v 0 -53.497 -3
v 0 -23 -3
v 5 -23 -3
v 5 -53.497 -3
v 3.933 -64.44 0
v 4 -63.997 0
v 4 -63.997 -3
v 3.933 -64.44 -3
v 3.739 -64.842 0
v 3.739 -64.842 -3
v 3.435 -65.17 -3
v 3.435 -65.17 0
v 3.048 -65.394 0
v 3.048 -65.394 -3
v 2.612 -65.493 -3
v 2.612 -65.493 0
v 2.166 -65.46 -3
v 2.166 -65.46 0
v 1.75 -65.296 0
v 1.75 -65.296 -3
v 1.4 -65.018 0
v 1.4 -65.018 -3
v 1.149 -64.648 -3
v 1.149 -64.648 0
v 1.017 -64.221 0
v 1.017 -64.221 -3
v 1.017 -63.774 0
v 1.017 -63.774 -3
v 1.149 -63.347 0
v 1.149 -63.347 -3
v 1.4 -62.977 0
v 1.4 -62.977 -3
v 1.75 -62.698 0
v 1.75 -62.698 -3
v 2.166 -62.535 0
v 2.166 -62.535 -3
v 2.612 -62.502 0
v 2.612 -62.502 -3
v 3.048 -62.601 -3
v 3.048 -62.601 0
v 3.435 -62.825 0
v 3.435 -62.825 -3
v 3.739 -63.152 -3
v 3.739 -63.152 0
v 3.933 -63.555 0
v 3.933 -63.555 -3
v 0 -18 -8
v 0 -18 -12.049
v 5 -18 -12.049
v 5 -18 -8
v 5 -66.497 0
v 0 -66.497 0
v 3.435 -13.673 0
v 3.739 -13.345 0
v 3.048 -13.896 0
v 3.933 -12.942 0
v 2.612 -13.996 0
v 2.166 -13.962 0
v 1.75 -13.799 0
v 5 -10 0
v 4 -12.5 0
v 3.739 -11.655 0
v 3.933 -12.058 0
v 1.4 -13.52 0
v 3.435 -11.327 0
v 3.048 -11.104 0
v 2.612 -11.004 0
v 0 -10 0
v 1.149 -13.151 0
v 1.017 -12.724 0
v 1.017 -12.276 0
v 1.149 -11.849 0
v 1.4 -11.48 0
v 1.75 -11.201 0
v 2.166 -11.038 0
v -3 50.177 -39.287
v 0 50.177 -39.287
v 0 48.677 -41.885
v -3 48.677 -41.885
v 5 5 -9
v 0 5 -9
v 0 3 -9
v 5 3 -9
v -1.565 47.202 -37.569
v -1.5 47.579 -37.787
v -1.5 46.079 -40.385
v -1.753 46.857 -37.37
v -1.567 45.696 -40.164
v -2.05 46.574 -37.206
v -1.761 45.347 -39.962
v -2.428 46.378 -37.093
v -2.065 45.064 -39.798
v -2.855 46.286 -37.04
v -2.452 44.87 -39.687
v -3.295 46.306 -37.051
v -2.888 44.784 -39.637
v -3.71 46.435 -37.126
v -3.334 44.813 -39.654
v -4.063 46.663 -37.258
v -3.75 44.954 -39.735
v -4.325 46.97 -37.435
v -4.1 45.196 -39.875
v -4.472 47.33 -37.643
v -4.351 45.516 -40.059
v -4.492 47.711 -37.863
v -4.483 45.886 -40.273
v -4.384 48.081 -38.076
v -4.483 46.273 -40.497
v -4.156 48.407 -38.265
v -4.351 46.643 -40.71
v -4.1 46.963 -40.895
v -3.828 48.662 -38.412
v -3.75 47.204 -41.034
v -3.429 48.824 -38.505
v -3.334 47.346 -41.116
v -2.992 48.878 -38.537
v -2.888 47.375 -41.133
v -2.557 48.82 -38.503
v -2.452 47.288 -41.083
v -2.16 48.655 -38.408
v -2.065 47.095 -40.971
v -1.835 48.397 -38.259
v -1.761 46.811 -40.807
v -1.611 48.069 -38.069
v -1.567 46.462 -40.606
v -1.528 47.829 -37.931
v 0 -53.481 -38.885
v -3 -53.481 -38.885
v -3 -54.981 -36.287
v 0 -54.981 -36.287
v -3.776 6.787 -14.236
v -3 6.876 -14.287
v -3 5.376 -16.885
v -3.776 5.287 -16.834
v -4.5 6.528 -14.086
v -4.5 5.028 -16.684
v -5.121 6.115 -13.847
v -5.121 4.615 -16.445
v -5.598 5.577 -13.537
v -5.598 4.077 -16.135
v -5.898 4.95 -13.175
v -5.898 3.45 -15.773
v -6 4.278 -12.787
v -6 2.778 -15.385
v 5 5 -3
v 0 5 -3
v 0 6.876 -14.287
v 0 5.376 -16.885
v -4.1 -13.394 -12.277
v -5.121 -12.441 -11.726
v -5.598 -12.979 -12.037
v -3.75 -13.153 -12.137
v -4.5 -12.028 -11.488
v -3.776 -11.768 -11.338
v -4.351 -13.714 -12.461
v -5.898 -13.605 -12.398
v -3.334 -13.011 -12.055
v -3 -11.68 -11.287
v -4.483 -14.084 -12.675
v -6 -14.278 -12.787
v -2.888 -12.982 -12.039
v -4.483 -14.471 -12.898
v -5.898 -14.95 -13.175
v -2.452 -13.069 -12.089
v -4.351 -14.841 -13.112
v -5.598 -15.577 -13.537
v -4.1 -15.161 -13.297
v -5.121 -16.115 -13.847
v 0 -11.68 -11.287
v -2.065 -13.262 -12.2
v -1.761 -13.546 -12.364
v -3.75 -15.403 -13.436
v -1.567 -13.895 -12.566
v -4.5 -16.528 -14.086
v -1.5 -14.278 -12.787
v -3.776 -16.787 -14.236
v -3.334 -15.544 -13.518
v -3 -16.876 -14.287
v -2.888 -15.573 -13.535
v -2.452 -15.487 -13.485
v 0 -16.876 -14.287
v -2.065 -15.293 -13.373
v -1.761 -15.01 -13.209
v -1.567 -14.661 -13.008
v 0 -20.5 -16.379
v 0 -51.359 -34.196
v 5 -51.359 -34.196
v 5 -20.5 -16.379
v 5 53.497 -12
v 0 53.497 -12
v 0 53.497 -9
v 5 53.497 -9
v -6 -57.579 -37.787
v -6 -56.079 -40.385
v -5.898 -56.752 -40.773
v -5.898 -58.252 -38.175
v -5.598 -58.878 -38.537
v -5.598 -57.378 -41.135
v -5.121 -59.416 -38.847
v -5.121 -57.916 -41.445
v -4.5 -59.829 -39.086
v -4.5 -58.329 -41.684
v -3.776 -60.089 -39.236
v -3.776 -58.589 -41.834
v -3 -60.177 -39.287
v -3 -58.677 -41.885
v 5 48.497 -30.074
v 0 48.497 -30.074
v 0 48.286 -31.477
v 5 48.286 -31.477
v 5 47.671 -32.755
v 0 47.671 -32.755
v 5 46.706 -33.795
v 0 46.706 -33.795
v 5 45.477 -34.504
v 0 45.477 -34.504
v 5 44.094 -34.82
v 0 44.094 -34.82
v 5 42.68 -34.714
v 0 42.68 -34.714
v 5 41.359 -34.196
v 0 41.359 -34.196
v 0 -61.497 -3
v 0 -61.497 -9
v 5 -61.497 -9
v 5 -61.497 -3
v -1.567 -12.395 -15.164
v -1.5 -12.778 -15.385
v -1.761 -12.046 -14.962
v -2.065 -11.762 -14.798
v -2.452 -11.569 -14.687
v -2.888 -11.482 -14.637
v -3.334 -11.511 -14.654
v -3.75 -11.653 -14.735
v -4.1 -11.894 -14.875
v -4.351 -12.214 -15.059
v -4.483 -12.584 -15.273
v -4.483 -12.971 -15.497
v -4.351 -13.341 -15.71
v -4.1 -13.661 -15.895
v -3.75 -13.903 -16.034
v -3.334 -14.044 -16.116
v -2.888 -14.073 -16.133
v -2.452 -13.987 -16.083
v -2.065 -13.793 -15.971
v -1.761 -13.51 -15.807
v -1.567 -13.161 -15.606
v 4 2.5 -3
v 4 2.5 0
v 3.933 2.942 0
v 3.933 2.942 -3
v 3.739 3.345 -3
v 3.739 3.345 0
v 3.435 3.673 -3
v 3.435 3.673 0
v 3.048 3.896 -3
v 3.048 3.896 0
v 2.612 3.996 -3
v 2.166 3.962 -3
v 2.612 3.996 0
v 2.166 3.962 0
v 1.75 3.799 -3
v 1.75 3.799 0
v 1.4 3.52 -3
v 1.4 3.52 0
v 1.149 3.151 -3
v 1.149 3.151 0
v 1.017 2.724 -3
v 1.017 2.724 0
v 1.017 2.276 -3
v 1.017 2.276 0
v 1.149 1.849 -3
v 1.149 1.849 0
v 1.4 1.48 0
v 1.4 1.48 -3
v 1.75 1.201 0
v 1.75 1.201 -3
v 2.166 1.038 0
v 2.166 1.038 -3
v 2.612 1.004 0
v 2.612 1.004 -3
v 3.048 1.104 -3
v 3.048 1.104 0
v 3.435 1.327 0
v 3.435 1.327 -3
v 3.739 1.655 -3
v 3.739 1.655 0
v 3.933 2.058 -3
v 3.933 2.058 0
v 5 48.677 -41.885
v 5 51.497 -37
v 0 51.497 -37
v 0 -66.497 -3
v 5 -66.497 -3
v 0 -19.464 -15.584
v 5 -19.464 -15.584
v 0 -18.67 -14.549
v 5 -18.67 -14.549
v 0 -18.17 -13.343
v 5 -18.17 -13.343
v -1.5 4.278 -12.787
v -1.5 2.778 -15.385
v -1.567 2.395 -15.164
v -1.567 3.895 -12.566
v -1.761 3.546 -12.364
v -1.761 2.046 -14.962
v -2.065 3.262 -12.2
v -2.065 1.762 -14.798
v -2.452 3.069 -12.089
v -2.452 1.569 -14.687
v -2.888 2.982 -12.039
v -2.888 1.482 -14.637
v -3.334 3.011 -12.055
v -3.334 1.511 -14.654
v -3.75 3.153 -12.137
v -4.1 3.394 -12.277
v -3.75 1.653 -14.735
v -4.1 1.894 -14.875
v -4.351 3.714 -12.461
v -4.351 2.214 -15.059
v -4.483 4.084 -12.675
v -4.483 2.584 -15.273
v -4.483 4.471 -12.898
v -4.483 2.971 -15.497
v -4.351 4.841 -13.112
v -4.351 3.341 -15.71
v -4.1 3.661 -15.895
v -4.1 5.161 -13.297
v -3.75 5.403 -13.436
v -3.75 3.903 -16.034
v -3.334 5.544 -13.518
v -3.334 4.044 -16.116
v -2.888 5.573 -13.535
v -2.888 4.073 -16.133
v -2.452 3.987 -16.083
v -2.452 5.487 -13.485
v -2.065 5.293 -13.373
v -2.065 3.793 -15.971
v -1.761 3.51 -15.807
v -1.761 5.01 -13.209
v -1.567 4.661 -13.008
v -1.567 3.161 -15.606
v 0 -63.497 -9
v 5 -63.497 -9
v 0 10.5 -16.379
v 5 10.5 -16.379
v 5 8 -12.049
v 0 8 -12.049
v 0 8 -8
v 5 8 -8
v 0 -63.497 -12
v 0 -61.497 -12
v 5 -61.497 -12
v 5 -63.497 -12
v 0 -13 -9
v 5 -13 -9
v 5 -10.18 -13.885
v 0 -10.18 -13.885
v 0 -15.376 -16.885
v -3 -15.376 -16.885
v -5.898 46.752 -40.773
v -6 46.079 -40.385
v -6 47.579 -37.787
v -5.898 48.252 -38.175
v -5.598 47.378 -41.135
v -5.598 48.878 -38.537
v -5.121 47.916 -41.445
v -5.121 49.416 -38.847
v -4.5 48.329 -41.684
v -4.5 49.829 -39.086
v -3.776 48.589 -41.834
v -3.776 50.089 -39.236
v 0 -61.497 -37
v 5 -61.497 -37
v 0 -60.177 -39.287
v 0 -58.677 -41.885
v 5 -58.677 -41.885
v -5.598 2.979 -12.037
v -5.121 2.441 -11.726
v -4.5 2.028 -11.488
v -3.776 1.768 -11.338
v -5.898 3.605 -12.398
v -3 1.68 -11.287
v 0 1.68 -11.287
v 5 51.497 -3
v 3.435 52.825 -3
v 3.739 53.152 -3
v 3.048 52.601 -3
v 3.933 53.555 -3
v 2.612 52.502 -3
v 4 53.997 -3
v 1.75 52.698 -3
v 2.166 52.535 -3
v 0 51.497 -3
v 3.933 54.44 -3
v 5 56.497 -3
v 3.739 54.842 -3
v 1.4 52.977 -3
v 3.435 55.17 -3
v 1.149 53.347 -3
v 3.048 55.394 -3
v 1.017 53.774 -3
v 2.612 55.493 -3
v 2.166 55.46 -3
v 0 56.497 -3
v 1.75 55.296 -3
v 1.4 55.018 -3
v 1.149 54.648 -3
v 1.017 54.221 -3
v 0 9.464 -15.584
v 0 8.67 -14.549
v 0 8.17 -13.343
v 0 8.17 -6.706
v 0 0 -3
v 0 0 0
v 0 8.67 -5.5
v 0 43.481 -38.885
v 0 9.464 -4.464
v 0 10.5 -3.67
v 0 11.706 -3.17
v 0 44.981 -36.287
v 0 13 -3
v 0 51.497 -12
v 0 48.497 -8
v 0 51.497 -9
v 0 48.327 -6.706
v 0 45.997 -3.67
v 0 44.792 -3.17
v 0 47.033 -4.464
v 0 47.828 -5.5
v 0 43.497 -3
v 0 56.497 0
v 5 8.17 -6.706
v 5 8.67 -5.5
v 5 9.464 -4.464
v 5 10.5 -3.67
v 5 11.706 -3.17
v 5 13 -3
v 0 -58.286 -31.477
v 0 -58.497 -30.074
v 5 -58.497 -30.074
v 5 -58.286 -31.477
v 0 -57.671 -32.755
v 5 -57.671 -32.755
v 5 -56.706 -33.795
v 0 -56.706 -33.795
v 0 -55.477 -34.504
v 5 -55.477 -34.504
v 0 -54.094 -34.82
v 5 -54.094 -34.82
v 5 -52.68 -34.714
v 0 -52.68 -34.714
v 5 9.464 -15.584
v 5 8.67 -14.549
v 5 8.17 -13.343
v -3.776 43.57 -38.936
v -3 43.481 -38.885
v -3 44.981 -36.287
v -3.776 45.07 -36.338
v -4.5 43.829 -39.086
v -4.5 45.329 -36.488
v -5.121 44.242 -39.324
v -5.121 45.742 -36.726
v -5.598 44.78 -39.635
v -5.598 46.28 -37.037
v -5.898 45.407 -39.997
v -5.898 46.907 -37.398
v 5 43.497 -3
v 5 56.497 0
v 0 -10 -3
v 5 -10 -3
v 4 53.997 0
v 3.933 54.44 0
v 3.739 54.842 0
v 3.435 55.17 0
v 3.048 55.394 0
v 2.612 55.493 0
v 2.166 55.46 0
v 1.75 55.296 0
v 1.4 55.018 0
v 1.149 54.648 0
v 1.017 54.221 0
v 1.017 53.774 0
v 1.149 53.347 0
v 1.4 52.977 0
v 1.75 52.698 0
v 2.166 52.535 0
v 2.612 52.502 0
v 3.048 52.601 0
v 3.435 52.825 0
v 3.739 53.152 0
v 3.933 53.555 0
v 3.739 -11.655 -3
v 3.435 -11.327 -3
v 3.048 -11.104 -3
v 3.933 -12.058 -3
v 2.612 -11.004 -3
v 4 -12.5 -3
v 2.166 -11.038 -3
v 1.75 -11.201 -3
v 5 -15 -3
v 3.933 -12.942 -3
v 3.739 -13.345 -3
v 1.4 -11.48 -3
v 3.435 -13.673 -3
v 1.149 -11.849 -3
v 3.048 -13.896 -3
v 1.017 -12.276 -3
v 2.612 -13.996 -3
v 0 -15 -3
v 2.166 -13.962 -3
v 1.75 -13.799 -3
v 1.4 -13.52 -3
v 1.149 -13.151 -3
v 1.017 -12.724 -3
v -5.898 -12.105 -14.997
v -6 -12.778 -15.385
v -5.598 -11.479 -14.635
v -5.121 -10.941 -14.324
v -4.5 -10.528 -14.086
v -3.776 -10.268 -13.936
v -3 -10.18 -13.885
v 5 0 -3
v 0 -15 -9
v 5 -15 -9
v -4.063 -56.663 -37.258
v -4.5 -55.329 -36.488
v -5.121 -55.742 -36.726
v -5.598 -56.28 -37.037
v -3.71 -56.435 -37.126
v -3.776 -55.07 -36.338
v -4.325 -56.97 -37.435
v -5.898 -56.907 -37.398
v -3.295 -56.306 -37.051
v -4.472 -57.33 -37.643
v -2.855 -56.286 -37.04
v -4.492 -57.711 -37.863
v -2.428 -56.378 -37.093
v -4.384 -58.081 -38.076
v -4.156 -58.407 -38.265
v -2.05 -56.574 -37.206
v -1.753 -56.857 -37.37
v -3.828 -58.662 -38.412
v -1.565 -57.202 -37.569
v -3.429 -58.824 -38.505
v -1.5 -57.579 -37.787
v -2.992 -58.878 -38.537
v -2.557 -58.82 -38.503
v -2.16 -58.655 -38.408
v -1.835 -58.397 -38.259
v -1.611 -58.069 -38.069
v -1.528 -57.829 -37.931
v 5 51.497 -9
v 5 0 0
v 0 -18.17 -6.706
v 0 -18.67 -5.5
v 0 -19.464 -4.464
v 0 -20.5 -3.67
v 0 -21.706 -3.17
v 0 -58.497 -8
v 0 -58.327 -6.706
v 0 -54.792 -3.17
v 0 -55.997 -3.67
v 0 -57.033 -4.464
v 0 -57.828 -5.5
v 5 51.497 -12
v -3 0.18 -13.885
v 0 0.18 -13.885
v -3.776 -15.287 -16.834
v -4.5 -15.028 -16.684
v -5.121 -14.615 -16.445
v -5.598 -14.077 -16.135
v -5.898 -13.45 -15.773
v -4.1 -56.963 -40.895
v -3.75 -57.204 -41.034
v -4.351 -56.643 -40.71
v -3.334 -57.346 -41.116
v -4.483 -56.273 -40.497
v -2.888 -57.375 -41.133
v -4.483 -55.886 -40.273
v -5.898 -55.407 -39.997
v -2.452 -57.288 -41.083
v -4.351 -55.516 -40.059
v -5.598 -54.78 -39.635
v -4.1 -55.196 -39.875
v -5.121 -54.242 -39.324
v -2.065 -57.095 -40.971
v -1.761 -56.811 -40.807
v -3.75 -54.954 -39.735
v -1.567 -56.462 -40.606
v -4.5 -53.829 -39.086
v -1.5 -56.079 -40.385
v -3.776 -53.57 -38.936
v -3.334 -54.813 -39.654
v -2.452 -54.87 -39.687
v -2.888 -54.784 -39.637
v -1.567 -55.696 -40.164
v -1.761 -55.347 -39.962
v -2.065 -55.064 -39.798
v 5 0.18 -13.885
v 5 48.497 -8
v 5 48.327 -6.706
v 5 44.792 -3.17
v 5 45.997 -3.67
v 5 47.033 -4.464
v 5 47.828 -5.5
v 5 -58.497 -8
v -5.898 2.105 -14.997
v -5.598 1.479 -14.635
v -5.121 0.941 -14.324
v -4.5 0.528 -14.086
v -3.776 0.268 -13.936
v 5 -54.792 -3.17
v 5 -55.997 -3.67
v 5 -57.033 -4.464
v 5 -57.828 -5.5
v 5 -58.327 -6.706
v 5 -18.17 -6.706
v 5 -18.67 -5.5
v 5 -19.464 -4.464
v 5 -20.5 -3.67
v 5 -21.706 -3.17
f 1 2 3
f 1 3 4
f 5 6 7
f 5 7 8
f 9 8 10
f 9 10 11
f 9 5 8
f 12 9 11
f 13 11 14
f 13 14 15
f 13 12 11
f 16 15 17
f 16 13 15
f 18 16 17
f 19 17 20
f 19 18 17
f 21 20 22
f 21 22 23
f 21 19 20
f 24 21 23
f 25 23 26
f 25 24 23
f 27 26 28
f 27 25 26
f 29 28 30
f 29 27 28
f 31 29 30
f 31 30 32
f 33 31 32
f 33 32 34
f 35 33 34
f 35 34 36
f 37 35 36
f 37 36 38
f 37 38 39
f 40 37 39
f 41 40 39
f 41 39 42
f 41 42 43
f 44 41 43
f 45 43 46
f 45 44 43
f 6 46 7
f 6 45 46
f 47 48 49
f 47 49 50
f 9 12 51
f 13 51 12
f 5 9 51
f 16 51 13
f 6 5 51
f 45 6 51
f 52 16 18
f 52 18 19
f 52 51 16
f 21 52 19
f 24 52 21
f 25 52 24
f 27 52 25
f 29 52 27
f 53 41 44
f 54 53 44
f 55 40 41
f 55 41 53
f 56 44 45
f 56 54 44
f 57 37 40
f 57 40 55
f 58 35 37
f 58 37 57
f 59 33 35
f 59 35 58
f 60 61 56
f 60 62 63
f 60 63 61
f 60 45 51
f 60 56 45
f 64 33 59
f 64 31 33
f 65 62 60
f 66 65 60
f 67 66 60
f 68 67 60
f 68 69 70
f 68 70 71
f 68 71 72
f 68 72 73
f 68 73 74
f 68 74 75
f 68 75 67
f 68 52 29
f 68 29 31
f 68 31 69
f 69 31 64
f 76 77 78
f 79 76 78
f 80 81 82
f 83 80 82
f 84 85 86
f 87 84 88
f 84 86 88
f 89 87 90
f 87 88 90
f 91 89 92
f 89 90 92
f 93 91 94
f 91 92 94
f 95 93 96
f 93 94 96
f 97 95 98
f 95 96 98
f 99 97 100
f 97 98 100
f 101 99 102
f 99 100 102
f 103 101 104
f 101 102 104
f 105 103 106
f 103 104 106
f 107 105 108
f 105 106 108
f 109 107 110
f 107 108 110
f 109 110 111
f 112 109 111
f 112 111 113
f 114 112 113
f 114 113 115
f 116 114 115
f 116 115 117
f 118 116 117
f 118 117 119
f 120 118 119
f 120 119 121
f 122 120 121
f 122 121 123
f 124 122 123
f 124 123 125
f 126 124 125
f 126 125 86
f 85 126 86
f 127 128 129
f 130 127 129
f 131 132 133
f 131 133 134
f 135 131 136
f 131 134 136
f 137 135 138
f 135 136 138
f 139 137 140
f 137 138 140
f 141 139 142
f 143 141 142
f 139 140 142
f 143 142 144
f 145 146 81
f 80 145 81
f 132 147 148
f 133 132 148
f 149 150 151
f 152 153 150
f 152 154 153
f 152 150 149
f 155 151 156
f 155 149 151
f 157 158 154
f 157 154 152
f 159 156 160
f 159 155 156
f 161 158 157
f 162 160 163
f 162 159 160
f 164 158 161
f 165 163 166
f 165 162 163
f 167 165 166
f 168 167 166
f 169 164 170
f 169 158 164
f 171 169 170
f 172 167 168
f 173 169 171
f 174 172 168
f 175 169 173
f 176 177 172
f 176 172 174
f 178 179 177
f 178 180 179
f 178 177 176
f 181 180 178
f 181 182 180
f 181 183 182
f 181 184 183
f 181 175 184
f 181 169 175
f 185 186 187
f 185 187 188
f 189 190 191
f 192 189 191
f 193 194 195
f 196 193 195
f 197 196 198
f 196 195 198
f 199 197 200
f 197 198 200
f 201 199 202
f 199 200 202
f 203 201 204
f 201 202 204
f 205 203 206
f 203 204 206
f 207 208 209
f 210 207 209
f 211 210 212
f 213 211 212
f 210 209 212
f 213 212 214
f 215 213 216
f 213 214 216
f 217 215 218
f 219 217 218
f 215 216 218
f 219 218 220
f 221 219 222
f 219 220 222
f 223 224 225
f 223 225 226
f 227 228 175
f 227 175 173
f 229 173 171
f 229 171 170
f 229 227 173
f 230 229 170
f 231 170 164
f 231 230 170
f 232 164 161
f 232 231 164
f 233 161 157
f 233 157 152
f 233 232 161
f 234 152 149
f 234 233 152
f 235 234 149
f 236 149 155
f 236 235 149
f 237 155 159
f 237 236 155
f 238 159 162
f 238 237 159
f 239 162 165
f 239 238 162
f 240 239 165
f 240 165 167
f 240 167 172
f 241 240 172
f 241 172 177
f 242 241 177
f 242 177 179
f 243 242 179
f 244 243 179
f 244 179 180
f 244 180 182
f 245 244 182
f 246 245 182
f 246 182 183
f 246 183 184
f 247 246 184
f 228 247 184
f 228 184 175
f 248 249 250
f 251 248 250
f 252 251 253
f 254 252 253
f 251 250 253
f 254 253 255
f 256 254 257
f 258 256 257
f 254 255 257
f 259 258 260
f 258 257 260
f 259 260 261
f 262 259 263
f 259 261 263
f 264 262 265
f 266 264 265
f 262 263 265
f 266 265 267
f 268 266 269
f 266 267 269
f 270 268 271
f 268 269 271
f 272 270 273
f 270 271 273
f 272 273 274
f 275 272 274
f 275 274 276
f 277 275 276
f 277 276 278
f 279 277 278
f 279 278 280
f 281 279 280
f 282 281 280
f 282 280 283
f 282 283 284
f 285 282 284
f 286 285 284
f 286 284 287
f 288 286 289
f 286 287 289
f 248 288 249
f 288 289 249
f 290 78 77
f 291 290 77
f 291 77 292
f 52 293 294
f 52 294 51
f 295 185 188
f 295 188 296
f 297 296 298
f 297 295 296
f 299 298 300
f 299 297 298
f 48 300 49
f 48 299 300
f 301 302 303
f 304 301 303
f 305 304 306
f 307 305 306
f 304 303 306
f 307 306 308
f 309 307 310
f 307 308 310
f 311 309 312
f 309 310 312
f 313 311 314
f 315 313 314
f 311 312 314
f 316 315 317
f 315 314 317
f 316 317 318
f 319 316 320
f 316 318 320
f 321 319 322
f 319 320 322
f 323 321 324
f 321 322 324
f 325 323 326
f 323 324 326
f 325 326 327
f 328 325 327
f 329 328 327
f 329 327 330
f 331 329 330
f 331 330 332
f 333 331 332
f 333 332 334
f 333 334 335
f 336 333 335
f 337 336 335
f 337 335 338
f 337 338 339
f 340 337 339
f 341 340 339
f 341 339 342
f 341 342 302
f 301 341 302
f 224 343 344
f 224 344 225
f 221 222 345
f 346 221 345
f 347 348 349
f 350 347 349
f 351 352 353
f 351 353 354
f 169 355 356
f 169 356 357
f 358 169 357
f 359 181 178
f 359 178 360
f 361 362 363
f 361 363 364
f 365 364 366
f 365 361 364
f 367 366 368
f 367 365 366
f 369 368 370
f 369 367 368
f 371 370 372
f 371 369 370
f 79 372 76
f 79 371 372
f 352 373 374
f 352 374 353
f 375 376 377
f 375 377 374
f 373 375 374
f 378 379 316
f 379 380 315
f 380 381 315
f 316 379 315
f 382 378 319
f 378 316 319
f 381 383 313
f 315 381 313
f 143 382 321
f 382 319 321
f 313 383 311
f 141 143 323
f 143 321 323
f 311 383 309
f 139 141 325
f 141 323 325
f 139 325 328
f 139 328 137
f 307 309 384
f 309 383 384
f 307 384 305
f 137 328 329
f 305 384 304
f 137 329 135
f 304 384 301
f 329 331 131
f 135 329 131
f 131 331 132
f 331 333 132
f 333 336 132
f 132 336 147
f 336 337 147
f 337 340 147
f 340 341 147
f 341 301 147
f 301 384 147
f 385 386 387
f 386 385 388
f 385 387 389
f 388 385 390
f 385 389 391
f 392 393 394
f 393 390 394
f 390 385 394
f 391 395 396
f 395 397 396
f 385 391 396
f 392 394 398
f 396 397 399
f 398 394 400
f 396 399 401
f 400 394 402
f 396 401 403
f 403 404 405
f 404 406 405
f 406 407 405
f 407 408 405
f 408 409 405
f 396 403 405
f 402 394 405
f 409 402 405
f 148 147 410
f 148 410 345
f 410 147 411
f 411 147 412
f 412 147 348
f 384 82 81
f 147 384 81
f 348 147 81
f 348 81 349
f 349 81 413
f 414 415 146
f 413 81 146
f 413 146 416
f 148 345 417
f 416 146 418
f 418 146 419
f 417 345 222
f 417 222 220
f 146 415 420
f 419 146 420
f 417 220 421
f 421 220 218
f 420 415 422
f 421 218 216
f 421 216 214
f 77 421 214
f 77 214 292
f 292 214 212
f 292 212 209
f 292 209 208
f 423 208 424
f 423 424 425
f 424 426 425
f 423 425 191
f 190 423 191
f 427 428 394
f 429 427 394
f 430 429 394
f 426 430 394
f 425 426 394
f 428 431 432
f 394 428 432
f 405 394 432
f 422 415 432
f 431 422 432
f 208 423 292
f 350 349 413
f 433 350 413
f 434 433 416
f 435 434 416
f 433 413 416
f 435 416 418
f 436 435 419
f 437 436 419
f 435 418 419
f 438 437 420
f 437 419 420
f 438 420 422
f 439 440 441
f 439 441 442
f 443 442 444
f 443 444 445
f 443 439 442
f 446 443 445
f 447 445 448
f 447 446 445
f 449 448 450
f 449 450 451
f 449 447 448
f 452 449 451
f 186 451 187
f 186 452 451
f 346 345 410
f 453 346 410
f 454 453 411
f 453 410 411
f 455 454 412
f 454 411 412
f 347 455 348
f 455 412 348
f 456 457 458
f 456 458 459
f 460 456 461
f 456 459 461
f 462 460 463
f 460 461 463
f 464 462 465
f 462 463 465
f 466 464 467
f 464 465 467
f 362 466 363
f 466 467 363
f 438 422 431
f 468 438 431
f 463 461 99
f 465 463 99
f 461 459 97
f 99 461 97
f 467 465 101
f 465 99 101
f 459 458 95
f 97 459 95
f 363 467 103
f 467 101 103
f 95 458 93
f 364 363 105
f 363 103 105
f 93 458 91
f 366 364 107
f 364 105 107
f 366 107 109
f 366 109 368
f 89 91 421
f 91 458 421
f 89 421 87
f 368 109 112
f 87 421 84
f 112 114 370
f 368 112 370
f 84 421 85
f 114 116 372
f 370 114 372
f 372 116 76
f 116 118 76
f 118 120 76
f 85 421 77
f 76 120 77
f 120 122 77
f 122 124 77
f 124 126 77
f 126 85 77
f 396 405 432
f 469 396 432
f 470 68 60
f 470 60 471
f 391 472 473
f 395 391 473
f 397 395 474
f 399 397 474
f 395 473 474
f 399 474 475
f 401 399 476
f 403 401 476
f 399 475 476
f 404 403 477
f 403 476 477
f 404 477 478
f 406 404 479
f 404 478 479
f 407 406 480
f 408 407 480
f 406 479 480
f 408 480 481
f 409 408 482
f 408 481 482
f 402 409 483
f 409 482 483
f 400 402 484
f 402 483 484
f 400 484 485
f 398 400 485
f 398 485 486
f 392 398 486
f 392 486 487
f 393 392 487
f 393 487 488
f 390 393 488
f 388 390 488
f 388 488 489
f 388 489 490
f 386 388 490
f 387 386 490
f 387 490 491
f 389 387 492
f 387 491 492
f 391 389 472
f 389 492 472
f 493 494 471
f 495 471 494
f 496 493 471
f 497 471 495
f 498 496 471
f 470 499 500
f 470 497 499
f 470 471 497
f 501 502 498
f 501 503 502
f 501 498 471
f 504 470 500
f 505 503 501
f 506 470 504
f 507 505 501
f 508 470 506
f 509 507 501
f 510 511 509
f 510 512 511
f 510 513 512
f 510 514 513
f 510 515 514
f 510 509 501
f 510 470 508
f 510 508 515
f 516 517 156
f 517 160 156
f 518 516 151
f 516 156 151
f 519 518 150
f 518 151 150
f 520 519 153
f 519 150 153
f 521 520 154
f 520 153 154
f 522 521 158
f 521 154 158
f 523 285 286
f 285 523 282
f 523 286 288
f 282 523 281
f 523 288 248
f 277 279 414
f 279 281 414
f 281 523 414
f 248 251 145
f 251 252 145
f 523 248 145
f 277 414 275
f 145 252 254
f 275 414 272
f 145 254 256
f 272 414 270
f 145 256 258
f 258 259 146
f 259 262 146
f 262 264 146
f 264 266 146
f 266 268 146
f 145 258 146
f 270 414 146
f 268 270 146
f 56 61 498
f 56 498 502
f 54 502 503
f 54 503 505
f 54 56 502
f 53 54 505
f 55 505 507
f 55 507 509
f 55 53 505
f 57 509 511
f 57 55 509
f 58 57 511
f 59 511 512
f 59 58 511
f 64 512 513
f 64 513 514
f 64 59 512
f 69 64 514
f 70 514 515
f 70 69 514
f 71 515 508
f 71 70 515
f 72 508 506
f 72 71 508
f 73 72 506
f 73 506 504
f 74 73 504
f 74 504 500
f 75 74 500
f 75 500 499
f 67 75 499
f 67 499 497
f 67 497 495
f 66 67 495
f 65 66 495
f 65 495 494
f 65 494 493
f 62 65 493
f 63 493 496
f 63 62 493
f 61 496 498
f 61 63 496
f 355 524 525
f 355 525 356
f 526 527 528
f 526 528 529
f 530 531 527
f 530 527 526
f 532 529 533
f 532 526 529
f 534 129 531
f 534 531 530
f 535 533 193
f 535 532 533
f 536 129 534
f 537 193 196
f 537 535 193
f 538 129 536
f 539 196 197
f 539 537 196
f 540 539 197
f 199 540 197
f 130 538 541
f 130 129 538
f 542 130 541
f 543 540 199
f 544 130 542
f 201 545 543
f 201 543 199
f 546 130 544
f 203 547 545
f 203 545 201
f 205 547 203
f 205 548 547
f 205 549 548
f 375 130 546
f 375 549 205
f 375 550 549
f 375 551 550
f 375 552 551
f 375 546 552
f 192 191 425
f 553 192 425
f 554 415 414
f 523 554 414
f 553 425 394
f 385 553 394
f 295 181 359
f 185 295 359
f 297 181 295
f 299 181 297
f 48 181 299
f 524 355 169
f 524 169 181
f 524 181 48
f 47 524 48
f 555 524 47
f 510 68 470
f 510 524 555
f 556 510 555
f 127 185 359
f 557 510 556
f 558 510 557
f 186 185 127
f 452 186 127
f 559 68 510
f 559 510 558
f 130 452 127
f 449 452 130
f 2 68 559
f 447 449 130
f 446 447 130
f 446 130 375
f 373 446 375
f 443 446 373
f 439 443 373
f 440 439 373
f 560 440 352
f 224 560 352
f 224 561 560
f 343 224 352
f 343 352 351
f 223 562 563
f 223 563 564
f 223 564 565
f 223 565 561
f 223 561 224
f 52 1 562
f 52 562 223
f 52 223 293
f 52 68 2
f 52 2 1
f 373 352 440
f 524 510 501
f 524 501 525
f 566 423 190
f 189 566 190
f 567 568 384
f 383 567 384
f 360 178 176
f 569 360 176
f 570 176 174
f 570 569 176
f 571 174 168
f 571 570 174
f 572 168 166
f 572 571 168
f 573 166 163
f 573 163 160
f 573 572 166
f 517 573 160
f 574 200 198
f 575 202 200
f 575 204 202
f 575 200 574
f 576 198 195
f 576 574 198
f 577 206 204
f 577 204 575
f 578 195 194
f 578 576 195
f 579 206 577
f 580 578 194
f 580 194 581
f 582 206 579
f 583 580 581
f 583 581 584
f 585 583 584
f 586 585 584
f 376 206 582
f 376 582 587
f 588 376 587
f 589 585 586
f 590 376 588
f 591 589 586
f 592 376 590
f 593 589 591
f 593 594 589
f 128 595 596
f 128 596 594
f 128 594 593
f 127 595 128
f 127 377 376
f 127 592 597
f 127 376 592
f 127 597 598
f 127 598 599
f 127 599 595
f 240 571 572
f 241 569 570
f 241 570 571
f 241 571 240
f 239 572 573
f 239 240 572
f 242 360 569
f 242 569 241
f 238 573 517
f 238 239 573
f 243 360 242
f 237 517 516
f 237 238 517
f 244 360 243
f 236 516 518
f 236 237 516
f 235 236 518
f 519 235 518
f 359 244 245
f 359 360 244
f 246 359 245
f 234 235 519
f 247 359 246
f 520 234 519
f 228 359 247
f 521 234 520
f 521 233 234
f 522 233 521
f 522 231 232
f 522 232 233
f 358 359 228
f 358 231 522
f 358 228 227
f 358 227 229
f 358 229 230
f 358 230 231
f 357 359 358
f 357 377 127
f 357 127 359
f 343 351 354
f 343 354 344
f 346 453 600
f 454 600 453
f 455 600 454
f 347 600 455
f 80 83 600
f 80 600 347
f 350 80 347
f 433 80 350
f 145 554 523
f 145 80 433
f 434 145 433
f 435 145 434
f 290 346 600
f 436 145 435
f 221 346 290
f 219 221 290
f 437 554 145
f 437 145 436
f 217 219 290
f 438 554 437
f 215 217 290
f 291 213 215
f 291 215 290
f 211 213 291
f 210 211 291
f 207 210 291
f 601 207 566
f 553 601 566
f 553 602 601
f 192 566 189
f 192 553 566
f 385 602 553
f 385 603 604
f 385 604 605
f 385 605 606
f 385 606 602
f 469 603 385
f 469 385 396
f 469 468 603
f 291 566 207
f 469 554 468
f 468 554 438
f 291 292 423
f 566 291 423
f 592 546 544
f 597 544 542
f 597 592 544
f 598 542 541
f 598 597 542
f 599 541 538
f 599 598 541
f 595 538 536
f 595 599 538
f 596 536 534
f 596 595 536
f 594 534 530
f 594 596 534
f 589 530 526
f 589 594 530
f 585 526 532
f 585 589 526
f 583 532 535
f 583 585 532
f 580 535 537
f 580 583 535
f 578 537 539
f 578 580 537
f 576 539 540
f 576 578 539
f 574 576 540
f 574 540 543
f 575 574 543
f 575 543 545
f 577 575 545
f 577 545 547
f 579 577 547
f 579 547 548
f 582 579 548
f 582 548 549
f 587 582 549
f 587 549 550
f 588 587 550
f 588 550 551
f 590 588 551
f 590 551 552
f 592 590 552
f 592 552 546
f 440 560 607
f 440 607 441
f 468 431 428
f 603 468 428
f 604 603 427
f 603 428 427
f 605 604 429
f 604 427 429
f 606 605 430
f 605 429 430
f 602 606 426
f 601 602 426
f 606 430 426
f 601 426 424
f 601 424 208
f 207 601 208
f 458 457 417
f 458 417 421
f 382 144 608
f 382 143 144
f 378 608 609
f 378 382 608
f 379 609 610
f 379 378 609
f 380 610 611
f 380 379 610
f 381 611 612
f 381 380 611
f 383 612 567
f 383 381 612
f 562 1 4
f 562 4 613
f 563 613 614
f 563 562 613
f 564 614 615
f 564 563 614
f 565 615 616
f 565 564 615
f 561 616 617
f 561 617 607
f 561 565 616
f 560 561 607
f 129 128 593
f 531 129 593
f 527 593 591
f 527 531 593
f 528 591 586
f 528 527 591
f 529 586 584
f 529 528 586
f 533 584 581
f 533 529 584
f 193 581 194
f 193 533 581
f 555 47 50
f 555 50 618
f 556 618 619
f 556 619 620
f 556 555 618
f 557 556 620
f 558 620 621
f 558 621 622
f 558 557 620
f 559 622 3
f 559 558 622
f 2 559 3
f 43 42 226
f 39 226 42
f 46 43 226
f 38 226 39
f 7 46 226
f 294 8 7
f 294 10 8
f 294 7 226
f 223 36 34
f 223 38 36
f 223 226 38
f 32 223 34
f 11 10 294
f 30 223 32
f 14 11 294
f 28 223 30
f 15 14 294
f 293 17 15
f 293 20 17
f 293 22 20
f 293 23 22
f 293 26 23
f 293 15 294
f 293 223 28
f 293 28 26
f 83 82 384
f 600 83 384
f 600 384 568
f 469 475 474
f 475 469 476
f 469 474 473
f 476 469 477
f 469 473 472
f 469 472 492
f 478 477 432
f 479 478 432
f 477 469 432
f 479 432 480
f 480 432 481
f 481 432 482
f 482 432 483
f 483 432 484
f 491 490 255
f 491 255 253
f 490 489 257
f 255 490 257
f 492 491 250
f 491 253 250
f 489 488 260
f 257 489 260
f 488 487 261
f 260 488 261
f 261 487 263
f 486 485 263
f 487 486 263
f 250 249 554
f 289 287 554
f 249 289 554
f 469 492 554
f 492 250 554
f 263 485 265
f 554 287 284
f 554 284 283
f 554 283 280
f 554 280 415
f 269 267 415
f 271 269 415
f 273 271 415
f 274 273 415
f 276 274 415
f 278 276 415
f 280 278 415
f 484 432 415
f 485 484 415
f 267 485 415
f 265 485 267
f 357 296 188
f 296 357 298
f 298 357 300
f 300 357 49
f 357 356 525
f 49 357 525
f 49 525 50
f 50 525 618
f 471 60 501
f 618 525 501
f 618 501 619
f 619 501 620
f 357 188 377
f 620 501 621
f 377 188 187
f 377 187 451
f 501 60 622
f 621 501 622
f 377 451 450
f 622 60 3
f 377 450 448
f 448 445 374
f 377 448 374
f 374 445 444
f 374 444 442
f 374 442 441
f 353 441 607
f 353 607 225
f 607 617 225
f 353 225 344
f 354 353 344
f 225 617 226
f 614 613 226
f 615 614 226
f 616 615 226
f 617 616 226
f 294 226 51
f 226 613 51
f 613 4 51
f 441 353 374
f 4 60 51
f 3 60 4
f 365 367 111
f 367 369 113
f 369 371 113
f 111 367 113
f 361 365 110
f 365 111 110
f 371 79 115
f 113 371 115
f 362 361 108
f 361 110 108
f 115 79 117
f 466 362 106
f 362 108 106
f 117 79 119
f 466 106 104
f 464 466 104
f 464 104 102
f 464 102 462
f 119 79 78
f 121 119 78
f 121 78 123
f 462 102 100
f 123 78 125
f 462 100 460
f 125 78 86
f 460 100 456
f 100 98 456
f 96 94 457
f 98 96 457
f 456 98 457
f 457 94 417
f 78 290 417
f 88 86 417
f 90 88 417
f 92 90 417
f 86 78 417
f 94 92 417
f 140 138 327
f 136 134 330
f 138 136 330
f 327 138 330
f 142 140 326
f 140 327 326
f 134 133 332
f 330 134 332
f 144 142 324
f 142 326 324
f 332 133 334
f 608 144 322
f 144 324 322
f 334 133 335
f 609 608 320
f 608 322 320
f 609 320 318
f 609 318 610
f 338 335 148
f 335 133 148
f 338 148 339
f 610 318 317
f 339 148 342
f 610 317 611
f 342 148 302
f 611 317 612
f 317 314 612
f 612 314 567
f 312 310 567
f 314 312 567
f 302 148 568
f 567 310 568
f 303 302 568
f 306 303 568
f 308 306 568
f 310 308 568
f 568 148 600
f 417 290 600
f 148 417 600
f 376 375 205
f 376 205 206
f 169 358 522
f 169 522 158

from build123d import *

# Parameters (mm, degrees)
F1_DEPTH = 5
F3_DEPTH = 6
F4_R     = 1.5
F5_DEPTH = 3
F6_R     = 1.5
F7_DEPTH = 25
F8_R     = 2.99999


# Not quite as in the source:
# - a fillet or chamfer is up to 0.001 mm smaller than in the source, because OpenCascade refuses the exact size


with BuildPart() as f1:
    # F0 (on Right) → F1 (new body)
    with BuildSketch(Plane.YZ):
        Polygon((15, 0), (0, 0), (0, -3), (5, -3), (5, -9), (3, -9), (0.1797888042, -13.8847490792), (48.6772114161, -41.8847490792), (51.4974226119, -37), (51.4974226119, -12), (53.4974226119, -12), (53.4974226119, -9), (51.4974226119, -9), (51.4974226119, -3), (56.4974226119, -3), (56.4974226119, 0), (48.4974226119, 0), align=None)
        with BuildLine():
            ThreePointArc((48.4974226119, -30.0741666773), (46.1179659481, -34.1955065134), (41.3590526205, -34.1955065134))
            Line((41.3590526205, -34.1955065134), (10.5, -16.3790241761))
            ThreePointArc((10.5, -16.3790241761), (8.6698729811, -14.5488971571), (8, -12.0488971571))
            Line((8, -12.0488971571), (8, -8))
            ThreePointArc((8, -8), (9.4644660941, -4.4644660941), (13, -3))
            Line((13, -3), (20, -3))
            Line((20, -3), (43.4974226119, -3))
            ThreePointArc((43.4974226119, -3), (47.0329565179, -4.4644660941), (48.4974226119, -8))
            Line((48.4974226119, -8), (48.4974226119, -12))
            Line((48.4974226119, -12), (48.4974226119, -30.0741666773))
        make_face(mode=Mode.SUBTRACT)
    extrude(amount=F1_DEPTH)

    # F2 (on face) → F3 (join)
    with BuildSketch(Plane(origin=(0, 0, 0), x_dir=(0, -1, 0), z_dir=(-1, 0, 0))):
        Polygon((-6.8759412269, -14.2866728679), (-5.3759412269, -16.8847490792), (-0.1797888042, -13.8847490792), (-1.6797888042, -11.2866728679), align=None)
        Polygon((-50.1772114161, -39.2866728679), (-48.6772114161, -41.8847490792), (-43.4810589934, -38.8847490792), (-44.981060144, -36.2866721082), align=None)
    extrude(amount=F3_DEPTH)

    # F4 (on face) → F5 (cut, through all)
    with BuildSketch(Plane.XY):
        with Locations((2.5, 2.5)):
            Circle(F4_R)
        with Locations((2.5, 53.9974226119)):
            Circle(F4_R)
    extrude(amount=-F5_DEPTH, mode=Mode.SUBTRACT)

    # F6 (on face) → F7 (cut)
    with BuildSketch(Plane(origin=(0, -5.9673255128, -10.3357109735), x_dir=(1, 0, 0), z_dir=(0, -0.5, -0.8660254038))):
        with Locations((-3, -10.0980762114)):
            Circle(F6_R)
        with Locations((-3, -60.0980762114)):
            Circle(F6_R)
    extrude(amount=-F7_DEPTH, mode=Mode.SUBTRACT)

    # F8 (radius 3 in the source; OpenCascade refuses exactly that, so slightly less here)
    f8_edges = [f1.edges().sort_by_distance(p)[0] for p in [
        (-6, 0.929789, -12.585711),
        (-6, 6.125941, -15.585711),
        (-6, 44.23106, -37.585711),
        (-6, 49.427211, -40.585711),
    ]]
    fillet(f8_edges, radius=F8_R)


with BuildPart() as f10_1:
    # F10: instance of F1
    add(f1.part.mirror(Plane.XZ.offset(5)))


solid = Compound([f1.part, f10_1.part])
